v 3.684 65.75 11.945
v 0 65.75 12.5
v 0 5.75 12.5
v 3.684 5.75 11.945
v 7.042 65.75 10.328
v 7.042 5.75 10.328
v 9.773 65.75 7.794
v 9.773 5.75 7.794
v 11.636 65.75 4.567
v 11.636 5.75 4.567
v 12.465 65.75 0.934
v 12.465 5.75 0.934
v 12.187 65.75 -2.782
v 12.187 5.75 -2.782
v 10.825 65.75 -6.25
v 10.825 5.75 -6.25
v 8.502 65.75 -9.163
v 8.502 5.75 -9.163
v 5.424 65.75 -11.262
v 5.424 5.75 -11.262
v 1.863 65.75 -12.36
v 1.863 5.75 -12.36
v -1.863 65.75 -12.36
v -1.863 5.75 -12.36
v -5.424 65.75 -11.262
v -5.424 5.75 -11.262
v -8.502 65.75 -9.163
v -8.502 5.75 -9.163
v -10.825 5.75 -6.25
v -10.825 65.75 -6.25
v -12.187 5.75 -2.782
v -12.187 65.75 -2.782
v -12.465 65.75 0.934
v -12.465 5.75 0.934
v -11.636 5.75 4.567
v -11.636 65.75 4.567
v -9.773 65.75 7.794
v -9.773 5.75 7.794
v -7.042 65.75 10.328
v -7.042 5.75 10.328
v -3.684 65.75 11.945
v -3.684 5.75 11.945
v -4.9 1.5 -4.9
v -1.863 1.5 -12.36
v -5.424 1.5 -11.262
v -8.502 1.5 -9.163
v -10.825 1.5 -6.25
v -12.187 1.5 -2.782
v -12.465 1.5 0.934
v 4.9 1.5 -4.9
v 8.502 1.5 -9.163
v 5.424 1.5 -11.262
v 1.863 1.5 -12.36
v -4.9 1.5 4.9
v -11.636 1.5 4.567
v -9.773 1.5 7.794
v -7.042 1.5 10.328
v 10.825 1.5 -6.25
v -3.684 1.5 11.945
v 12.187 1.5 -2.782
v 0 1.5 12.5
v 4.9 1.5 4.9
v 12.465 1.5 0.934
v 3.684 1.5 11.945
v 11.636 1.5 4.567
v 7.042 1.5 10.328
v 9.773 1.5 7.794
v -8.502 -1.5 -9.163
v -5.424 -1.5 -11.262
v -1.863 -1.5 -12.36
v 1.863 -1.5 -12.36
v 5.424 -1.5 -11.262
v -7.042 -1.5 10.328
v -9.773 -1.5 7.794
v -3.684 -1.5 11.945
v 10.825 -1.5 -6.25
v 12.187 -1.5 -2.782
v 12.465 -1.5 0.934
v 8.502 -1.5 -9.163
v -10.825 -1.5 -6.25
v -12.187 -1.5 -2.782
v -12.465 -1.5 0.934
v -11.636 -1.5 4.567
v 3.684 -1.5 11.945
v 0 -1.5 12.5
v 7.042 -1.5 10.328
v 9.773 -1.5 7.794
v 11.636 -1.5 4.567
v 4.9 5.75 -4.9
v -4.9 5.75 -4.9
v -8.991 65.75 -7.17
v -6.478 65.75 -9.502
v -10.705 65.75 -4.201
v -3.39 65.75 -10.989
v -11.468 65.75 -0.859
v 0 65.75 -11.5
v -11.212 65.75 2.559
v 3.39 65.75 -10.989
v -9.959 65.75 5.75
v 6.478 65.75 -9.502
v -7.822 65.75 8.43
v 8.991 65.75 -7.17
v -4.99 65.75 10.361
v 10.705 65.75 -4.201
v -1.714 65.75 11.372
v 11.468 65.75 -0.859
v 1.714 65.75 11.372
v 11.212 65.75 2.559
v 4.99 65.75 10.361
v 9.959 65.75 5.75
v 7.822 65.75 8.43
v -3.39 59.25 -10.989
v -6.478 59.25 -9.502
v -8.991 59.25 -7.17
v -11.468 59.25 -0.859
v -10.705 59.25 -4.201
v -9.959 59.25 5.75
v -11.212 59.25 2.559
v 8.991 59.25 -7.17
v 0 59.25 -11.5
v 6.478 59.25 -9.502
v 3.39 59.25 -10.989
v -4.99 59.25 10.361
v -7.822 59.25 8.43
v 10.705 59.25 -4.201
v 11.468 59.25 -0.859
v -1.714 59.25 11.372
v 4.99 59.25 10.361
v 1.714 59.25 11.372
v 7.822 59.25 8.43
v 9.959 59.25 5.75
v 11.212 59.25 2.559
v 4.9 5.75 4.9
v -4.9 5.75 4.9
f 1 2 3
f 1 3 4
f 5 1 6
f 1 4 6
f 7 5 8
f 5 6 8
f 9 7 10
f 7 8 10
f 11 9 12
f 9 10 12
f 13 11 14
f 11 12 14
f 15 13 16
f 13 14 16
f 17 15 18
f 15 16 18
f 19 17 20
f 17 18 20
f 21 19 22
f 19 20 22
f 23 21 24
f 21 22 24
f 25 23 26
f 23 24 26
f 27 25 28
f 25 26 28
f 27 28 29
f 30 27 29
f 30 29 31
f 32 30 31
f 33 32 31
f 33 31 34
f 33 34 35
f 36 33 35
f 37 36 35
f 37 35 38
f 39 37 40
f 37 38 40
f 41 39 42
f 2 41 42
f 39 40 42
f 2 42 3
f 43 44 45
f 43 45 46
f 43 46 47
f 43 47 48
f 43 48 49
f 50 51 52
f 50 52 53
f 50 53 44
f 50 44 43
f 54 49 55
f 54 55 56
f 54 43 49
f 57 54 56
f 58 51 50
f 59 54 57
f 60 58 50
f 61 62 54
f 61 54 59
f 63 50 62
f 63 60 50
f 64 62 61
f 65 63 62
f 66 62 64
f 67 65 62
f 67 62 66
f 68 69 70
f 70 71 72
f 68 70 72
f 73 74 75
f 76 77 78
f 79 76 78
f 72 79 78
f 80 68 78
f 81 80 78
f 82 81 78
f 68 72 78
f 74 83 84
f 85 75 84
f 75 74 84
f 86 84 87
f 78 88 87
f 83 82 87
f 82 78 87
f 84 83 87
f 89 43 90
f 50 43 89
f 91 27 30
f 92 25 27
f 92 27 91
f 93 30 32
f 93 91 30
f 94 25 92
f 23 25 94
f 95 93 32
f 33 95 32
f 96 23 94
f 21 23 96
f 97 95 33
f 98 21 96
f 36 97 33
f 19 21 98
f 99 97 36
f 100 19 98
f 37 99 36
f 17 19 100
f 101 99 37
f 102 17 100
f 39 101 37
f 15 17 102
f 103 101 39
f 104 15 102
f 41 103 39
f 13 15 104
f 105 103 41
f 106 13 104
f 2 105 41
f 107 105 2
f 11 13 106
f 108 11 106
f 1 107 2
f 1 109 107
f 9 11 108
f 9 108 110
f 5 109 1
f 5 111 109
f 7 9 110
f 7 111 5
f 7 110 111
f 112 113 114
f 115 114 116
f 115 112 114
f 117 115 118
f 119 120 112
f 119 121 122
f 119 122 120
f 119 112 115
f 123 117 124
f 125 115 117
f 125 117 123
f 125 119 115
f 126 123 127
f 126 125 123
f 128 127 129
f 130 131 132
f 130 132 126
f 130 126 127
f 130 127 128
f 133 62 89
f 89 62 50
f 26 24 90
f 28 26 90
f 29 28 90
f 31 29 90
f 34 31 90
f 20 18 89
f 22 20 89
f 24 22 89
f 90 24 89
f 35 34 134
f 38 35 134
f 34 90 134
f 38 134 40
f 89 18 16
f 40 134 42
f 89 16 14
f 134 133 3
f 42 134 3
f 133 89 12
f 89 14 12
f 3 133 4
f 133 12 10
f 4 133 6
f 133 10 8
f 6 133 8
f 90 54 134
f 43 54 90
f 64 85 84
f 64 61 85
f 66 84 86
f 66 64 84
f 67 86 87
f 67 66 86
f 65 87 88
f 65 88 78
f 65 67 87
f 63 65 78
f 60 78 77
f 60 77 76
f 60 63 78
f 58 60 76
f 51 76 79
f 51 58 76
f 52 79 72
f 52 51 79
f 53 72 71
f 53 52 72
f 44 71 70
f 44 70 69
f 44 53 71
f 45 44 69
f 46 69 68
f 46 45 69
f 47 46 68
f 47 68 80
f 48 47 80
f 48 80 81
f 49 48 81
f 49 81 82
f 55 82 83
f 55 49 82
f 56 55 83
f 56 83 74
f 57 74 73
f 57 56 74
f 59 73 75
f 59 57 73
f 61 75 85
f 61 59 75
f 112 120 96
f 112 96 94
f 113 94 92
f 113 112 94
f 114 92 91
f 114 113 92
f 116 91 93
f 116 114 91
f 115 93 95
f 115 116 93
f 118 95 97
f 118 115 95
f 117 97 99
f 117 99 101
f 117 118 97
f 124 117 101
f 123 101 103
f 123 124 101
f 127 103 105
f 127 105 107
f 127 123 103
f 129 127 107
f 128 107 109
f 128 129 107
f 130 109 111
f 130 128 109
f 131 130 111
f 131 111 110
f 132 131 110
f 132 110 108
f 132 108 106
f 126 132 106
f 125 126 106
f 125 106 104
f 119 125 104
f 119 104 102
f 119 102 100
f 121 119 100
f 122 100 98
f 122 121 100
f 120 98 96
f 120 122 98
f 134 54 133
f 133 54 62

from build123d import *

# Parameters (mm, degrees)
SKETCH1_R           = 12.5
BOSS_EXTRUDE1_DEPTH = 1.5
SKETCH2_W           = 9.8
SKETCH2_H           = 9.8
BOSS_EXTRUDE2_DEPTH = 4.25
SKETCH3_R           = 12.5
BOSS_EXTRUDE3_DEPTH = 47.5
SKETCH4_R           = 12.5
BOSS_EXTRUDE4_DEPTH = 3
SKETCH5_R           = 12.5
SKETCH5_R_2         = 11.5
BOSS_EXTRUDE5_DEPTH = 6.5


with BuildPart() as part:
    # Sketch1 → Boss-Extrude1 (new, symmetric)
    with BuildSketch(Plane(origin=(0, 0, 0), x_dir=(1, 0, 0), z_dir=(0, 1, 0))):
        with Locations(Location((0, 0, 0), (0, 0, 270))):
            Circle(SKETCH1_R)
    boss_extrude1 = extrude(amount=BOSS_EXTRUDE1_DEPTH, both=True)

    # Sketch2 → Boss-Extrude2 (add)
    with BuildSketch(Plane(origin=(0, 1.5, 0), x_dir=(1, 0, 0), z_dir=(0, 1, 0))):
        Rectangle(SKETCH2_W, SKETCH2_H)
    extrude(amount=BOSS_EXTRUDE2_DEPTH)

    # Mirror1: Boss-Extrude1 across plane
    add(boss_extrude1.mirror(Plane.ZX.offset(3.625)))

    # Sketch3 → Boss-Extrude3 (add)
    with BuildSketch(Plane(origin=(0, 8.75, 0), x_dir=(1, 0, 0), z_dir=(0, 1, 0))):
        with Locations(Location((0, 0, 0), (0, 0, 270))):
            Circle(SKETCH3_R)
    extrude(amount=BOSS_EXTRUDE3_DEPTH)

    # Sketch4 → Boss-Extrude4 (add)
    with BuildSketch(Plane(origin=(0, 56.25, 0), x_dir=(1, 0, 0), z_dir=(0, 1, 0))):
        with Locations(Location((0, 0, 0), (0, 0, 270))):
            Circle(SKETCH4_R)
    extrude(amount=BOSS_EXTRUDE4_DEPTH)

    # Sketch5 → Boss-Extrude5 (add)
    with BuildSketch(Plane(origin=(0, 59.25, 0), x_dir=(1, 0, 0), z_dir=(0, 1, 0))):
        with Locations(Location((0, 0, 0), (0, 0, 270))):
            Circle(SKETCH5_R)
        with Locations(Location((0, 0, 0), (0, 0, 90))):
            Circle(SKETCH5_R_2, mode=Mode.SUBTRACT)
    extrude(amount=BOSS_EXTRUDE5_DEPTH)


solid = part.part
